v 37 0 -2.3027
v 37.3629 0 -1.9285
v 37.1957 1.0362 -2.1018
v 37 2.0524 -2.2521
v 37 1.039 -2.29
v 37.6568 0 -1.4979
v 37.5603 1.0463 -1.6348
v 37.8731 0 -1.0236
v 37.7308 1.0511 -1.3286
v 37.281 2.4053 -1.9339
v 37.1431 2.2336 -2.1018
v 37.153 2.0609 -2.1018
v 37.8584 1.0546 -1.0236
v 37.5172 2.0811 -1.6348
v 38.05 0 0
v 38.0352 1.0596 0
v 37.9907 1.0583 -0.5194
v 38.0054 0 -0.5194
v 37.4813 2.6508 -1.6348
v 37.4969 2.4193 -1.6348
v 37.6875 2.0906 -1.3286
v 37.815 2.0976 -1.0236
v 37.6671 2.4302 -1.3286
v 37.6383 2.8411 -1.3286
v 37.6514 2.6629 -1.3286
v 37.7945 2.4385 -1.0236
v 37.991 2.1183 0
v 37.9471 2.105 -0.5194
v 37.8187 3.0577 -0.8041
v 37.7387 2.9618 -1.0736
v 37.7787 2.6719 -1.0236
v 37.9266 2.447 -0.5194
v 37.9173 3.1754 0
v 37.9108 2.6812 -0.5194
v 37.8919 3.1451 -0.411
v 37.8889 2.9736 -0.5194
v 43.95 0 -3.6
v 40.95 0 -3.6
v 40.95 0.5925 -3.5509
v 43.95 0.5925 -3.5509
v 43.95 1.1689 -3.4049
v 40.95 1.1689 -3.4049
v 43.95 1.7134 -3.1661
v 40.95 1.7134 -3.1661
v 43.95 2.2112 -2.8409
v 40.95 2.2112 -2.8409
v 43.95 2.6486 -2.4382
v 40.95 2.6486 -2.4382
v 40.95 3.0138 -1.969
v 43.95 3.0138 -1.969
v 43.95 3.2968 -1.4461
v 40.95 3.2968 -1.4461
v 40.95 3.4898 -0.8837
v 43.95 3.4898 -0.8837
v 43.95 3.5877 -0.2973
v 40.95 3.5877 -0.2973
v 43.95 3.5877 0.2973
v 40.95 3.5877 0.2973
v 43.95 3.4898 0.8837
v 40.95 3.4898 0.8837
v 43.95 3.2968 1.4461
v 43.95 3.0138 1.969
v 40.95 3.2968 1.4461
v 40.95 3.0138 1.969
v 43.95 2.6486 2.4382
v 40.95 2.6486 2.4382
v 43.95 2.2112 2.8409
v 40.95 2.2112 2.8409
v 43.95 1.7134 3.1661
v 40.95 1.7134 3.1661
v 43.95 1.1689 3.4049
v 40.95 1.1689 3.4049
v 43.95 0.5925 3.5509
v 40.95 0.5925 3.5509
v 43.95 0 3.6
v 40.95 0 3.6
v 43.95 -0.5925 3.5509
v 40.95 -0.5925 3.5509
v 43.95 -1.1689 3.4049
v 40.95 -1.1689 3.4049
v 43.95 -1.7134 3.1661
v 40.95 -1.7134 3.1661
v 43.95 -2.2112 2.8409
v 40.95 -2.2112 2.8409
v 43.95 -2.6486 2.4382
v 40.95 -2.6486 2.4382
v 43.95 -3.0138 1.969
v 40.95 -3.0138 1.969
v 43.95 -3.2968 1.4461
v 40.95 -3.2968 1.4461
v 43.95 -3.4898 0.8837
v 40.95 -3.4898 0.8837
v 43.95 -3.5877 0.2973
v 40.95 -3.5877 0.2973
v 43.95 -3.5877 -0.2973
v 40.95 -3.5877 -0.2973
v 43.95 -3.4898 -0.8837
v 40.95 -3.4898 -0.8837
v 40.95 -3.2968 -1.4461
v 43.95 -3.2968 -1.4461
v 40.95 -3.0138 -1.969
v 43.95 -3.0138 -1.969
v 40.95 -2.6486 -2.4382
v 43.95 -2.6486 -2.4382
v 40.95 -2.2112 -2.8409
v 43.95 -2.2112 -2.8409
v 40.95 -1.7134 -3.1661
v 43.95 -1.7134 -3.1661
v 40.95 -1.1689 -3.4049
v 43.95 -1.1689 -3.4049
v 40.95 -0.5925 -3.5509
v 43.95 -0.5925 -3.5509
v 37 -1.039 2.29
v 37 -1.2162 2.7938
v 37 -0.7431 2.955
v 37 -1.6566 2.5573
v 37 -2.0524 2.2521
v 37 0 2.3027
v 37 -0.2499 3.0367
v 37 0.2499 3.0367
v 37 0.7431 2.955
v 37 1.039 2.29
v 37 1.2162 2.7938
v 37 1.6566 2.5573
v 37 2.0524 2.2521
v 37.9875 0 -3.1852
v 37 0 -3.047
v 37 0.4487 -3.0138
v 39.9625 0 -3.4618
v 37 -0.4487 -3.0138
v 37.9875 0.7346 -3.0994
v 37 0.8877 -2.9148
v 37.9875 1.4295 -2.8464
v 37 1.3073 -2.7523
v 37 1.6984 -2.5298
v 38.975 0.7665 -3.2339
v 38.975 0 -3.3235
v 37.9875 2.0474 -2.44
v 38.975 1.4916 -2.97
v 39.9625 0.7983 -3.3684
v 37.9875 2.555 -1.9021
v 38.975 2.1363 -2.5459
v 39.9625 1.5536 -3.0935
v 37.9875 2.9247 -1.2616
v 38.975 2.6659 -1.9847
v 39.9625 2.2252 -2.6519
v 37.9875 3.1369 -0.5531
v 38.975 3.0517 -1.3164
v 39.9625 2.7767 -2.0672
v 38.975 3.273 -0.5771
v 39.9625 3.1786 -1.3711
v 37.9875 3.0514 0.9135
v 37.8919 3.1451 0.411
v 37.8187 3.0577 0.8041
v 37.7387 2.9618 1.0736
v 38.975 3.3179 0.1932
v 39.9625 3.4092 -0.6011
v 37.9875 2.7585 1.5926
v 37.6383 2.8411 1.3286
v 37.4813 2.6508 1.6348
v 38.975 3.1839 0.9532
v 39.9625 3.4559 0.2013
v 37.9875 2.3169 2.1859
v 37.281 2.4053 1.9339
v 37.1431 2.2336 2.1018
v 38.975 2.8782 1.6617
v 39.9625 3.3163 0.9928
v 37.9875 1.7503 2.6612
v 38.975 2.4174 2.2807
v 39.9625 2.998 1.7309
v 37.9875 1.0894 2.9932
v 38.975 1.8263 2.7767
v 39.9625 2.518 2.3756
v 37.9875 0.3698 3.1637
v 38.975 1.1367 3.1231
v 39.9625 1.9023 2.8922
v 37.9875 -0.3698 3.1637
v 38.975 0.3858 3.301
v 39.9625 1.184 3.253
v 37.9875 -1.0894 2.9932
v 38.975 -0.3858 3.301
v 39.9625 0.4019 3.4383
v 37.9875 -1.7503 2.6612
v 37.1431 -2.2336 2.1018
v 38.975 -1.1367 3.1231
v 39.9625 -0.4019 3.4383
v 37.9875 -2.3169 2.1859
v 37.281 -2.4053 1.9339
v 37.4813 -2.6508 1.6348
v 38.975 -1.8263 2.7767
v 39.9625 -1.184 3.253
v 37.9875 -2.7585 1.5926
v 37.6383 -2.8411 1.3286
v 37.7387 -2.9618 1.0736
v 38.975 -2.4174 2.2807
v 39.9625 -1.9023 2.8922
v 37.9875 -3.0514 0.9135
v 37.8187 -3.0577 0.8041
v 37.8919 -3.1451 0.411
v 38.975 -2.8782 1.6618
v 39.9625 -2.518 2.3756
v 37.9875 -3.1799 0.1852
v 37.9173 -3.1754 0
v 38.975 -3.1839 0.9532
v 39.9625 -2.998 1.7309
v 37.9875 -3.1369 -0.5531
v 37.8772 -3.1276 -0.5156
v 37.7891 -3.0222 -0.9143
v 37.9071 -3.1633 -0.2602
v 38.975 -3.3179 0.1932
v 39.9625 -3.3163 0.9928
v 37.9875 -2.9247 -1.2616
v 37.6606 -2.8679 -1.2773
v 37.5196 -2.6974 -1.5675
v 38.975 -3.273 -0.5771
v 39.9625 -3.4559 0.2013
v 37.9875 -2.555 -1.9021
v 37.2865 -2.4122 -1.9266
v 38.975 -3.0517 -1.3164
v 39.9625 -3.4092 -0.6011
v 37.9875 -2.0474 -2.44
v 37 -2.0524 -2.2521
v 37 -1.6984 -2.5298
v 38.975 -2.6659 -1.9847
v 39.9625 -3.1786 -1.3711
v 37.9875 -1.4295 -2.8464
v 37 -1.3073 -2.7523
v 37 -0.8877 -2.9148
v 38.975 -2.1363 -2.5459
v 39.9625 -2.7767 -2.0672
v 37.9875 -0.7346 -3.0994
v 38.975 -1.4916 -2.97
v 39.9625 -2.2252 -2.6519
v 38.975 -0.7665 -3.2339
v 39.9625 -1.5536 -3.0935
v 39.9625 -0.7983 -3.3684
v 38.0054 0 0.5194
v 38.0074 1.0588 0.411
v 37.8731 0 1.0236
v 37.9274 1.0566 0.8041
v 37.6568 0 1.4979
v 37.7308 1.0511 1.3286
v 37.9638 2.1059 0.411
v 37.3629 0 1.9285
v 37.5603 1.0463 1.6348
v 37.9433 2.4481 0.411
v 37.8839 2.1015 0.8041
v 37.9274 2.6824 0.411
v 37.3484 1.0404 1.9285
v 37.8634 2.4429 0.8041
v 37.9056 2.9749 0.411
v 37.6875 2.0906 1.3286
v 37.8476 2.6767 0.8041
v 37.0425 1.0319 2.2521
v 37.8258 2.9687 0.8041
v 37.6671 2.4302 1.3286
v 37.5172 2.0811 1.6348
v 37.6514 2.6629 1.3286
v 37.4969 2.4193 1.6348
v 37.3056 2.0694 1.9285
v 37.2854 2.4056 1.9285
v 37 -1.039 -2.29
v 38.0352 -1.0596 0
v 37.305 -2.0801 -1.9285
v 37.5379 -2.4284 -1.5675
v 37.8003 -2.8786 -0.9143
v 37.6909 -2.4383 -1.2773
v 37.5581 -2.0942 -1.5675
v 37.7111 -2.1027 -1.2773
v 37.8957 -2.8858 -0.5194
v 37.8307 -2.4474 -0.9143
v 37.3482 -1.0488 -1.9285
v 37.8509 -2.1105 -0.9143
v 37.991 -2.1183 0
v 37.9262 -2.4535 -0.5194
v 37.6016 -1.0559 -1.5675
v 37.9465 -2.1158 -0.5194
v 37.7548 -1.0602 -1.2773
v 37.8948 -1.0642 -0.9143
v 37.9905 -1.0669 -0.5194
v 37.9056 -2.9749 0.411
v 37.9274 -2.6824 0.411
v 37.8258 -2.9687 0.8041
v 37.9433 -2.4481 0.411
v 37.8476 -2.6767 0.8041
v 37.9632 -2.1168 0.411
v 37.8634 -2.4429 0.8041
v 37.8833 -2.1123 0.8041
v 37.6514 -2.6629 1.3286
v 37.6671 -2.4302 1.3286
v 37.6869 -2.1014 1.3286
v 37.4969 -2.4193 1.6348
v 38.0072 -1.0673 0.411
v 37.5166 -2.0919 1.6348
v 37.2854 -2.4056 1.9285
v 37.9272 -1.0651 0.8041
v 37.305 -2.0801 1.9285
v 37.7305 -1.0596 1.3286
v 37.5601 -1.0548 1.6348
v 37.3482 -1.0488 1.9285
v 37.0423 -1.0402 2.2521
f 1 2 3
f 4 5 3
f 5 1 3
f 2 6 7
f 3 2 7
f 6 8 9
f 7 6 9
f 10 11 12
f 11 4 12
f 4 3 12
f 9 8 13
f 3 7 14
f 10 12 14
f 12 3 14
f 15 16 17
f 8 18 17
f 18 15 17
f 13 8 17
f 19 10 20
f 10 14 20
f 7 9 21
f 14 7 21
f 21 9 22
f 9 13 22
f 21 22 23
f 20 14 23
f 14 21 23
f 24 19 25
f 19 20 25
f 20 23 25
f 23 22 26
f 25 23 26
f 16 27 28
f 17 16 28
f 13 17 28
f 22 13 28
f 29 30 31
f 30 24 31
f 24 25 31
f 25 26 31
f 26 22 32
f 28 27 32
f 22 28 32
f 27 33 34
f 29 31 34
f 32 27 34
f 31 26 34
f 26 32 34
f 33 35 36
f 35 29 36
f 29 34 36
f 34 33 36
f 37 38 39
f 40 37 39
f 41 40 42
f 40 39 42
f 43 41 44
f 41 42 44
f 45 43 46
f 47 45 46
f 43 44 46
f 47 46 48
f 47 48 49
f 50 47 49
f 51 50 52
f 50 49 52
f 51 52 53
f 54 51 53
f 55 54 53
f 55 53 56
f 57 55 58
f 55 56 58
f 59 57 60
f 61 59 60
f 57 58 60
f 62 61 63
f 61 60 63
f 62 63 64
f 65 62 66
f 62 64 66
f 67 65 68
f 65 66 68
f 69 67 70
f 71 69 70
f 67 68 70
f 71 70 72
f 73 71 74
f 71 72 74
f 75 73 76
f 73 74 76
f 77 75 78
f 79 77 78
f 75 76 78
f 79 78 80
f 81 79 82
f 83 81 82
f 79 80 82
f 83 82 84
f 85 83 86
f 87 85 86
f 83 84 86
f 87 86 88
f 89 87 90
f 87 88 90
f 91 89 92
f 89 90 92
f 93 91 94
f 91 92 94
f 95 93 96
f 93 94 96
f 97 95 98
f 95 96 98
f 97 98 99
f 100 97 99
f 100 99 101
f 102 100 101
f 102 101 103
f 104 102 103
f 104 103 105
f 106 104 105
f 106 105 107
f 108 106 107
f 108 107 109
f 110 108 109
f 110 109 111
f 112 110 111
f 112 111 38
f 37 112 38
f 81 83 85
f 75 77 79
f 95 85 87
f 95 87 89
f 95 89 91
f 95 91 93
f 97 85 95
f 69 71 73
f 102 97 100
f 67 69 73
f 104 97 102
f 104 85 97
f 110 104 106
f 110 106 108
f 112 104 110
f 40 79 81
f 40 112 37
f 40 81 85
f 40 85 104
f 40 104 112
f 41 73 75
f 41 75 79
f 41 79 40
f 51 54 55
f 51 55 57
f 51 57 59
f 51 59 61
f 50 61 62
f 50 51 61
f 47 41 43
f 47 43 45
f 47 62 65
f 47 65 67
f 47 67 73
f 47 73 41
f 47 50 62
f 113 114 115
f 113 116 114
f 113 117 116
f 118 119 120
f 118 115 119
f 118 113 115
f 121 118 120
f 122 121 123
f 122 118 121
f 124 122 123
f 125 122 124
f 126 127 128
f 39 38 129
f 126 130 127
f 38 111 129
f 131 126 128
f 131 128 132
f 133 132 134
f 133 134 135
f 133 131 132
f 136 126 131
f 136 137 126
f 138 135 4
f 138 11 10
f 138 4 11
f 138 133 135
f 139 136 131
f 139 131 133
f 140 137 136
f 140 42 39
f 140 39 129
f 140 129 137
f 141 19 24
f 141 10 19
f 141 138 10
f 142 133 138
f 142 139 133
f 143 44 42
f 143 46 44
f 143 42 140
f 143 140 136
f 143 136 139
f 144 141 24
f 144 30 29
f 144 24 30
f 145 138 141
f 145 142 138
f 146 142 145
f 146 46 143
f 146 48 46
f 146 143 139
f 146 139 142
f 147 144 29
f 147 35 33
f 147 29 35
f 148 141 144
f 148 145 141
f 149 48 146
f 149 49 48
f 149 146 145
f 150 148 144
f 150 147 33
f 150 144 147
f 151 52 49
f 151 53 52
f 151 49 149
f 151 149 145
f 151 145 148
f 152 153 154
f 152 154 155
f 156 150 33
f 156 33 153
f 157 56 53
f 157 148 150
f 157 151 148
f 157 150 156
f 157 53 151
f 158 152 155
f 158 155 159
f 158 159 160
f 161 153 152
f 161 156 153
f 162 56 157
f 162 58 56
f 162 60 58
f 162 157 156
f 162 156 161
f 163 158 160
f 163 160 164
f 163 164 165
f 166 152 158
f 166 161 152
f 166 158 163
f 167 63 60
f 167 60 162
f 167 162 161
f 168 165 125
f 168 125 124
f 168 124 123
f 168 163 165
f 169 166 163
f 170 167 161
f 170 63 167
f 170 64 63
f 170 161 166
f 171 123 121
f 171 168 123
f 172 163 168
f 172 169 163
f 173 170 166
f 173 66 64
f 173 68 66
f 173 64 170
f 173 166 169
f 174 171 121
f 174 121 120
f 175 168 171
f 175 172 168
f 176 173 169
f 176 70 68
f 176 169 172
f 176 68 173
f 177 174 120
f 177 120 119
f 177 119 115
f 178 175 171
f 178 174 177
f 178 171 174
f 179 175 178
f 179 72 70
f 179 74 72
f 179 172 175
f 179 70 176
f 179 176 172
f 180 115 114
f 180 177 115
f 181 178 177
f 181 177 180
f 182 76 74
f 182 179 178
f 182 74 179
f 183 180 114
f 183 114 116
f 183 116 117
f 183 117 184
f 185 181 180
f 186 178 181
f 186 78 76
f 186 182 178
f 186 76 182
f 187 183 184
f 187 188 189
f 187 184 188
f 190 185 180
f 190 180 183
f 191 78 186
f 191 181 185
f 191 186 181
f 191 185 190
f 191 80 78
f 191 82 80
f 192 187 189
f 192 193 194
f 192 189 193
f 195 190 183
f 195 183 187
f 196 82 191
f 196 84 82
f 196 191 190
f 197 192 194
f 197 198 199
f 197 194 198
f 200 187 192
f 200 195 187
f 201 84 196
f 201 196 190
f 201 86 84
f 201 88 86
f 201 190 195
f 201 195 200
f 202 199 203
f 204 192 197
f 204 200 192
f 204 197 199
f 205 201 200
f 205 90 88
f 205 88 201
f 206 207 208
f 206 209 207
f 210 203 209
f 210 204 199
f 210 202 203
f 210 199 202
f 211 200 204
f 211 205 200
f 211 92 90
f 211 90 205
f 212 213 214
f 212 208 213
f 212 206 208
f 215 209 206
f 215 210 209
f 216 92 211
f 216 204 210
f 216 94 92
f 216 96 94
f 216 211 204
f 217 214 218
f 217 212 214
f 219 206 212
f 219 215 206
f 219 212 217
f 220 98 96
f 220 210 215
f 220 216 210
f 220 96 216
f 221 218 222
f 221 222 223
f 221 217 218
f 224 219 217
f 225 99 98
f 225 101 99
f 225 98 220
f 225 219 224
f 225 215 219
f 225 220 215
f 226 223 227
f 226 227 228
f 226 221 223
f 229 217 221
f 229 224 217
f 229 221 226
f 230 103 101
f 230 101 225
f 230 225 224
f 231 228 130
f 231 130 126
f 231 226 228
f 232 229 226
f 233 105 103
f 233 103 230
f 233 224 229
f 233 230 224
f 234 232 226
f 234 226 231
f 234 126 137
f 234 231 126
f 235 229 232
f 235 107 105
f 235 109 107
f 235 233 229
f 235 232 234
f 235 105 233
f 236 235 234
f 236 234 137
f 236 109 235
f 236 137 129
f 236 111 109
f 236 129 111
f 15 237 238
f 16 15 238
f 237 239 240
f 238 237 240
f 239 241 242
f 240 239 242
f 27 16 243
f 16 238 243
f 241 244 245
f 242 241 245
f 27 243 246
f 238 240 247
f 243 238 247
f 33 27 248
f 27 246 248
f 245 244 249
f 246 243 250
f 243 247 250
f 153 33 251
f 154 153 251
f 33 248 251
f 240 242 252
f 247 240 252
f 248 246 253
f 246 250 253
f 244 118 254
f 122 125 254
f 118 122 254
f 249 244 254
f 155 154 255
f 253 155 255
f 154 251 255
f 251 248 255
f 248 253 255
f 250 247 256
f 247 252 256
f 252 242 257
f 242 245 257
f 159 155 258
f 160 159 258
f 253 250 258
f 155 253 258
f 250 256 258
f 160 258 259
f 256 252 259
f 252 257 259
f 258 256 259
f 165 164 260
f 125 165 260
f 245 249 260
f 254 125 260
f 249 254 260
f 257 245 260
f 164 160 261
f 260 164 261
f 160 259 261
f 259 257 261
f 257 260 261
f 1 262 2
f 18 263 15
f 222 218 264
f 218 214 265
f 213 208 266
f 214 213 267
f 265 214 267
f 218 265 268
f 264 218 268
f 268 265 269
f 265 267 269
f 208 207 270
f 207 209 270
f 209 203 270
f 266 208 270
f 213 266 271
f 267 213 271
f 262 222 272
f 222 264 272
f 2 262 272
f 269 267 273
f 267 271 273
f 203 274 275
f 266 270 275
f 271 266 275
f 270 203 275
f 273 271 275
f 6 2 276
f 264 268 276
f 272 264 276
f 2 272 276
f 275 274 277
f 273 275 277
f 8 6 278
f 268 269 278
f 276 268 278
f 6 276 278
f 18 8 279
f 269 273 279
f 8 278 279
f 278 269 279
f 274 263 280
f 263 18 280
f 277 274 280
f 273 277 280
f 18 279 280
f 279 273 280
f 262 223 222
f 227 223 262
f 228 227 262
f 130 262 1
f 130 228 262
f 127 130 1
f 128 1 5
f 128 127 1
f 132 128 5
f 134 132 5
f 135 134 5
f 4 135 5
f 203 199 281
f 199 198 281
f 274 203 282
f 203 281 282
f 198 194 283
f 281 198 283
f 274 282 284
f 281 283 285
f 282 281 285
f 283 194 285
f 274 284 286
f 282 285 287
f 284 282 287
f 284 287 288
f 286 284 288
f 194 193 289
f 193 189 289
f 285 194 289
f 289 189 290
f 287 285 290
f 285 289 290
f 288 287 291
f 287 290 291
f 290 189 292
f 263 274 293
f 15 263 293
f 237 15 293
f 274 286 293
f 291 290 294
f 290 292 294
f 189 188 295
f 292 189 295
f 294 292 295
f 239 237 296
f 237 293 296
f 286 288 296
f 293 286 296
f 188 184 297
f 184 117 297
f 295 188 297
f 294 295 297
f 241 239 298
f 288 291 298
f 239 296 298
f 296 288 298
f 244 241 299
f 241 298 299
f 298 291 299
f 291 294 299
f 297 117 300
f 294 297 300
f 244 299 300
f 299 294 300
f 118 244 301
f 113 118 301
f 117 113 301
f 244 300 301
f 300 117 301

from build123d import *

# Parameters (mm, degrees)
TORUS020_R              = 3.05
CONE003_PITCH_ANGLE     = 90
CYLINDER801_R           = 3.6
CYLINDER801_DEPTH       = 3
CYLINDER801_PITCH_ANGLE = 90
BOX179_W                = 16
BOX179_H                = 10
BOX179_DEPTH            = 10


with BuildPart() as torus:
    # Torus020 → Torus020 (revolve)
    with BuildSketch(Plane(origin=(0, 0, 1), x_dir=(1, 0, 0), z_dir=(0, -1, 0))):
        with Locations((35, 0)):
            Circle(TORUS020_R)
    revolve(axis=Axis((0, 0, 1), (0, 0, 1)))


with BuildPart() as cone:
    # Cone003 → Cone003 (revolve)
    with BuildSketch(Plane.XZ):
        Polygon((0, 0), (2.9, 0), (3.6, 5), (0, 5), align=None)
    revolve(axis=Axis((0, 0, 0), (0, 0, 1)))


with BuildPart() as cone_1:
    # Cone003 pitch: moved
    add(cone.part.rotate(Axis((0, 0, 0), (0, 1, 0)), CONE003_PITCH_ANGLE))


with BuildPart() as cone_2:
    # Cone003 placement: moved
    add(cone_1.part.moved(Location((34.95, 0, 0))))


with BuildPart() as cut:
    # Cylinder801 → Cylinder801 (new body)
    with BuildSketch(Plane.XY):
        Circle(CYLINDER801_R)
    extrude(amount=CYLINDER801_DEPTH)


with BuildPart() as cut_1:
    # Cylinder801 pitch: moved
    add(cut.part.rotate(Axis((0, 0, 0), (0, 1, 0)), CYLINDER801_PITCH_ANGLE))


with BuildPart() as cut_2:
    # Cylinder801 placement: moved
    add(cut_1.part.moved(Location((39.95, 0, 0))))

    # Fusion611: union Cone
    add(cone_2.part)


with BuildPart() as cut_3:
    # Fusion611 placement: moved
    add(cut_2.part.moved(Location((1, 0, 1))))

    # Cut066379: cut Torus
    add(torus.part, mode=Mode.SUBTRACT)


with BuildPart() as art4bearingplug:
    # Box179 → Box179 (new body)
    with BuildSketch(Plane(origin=(37, -5, -3), x_dir=(1, 0, 0), z_dir=(0, 0, 1))):
        with Locations((8, 5)):
            Rectangle(BOX179_W, BOX179_H)
    extrude(amount=BOX179_DEPTH)

    # Common053: intersect Cut
    add(cut_3.part, mode=Mode.INTERSECT)


with BuildPart() as art4bearingplug_1:
    # Common053 placement: moved
    add(art4bearingplug.part.moved(Location((0, 0, -1))))


solid = art4bearingplug_1.part
